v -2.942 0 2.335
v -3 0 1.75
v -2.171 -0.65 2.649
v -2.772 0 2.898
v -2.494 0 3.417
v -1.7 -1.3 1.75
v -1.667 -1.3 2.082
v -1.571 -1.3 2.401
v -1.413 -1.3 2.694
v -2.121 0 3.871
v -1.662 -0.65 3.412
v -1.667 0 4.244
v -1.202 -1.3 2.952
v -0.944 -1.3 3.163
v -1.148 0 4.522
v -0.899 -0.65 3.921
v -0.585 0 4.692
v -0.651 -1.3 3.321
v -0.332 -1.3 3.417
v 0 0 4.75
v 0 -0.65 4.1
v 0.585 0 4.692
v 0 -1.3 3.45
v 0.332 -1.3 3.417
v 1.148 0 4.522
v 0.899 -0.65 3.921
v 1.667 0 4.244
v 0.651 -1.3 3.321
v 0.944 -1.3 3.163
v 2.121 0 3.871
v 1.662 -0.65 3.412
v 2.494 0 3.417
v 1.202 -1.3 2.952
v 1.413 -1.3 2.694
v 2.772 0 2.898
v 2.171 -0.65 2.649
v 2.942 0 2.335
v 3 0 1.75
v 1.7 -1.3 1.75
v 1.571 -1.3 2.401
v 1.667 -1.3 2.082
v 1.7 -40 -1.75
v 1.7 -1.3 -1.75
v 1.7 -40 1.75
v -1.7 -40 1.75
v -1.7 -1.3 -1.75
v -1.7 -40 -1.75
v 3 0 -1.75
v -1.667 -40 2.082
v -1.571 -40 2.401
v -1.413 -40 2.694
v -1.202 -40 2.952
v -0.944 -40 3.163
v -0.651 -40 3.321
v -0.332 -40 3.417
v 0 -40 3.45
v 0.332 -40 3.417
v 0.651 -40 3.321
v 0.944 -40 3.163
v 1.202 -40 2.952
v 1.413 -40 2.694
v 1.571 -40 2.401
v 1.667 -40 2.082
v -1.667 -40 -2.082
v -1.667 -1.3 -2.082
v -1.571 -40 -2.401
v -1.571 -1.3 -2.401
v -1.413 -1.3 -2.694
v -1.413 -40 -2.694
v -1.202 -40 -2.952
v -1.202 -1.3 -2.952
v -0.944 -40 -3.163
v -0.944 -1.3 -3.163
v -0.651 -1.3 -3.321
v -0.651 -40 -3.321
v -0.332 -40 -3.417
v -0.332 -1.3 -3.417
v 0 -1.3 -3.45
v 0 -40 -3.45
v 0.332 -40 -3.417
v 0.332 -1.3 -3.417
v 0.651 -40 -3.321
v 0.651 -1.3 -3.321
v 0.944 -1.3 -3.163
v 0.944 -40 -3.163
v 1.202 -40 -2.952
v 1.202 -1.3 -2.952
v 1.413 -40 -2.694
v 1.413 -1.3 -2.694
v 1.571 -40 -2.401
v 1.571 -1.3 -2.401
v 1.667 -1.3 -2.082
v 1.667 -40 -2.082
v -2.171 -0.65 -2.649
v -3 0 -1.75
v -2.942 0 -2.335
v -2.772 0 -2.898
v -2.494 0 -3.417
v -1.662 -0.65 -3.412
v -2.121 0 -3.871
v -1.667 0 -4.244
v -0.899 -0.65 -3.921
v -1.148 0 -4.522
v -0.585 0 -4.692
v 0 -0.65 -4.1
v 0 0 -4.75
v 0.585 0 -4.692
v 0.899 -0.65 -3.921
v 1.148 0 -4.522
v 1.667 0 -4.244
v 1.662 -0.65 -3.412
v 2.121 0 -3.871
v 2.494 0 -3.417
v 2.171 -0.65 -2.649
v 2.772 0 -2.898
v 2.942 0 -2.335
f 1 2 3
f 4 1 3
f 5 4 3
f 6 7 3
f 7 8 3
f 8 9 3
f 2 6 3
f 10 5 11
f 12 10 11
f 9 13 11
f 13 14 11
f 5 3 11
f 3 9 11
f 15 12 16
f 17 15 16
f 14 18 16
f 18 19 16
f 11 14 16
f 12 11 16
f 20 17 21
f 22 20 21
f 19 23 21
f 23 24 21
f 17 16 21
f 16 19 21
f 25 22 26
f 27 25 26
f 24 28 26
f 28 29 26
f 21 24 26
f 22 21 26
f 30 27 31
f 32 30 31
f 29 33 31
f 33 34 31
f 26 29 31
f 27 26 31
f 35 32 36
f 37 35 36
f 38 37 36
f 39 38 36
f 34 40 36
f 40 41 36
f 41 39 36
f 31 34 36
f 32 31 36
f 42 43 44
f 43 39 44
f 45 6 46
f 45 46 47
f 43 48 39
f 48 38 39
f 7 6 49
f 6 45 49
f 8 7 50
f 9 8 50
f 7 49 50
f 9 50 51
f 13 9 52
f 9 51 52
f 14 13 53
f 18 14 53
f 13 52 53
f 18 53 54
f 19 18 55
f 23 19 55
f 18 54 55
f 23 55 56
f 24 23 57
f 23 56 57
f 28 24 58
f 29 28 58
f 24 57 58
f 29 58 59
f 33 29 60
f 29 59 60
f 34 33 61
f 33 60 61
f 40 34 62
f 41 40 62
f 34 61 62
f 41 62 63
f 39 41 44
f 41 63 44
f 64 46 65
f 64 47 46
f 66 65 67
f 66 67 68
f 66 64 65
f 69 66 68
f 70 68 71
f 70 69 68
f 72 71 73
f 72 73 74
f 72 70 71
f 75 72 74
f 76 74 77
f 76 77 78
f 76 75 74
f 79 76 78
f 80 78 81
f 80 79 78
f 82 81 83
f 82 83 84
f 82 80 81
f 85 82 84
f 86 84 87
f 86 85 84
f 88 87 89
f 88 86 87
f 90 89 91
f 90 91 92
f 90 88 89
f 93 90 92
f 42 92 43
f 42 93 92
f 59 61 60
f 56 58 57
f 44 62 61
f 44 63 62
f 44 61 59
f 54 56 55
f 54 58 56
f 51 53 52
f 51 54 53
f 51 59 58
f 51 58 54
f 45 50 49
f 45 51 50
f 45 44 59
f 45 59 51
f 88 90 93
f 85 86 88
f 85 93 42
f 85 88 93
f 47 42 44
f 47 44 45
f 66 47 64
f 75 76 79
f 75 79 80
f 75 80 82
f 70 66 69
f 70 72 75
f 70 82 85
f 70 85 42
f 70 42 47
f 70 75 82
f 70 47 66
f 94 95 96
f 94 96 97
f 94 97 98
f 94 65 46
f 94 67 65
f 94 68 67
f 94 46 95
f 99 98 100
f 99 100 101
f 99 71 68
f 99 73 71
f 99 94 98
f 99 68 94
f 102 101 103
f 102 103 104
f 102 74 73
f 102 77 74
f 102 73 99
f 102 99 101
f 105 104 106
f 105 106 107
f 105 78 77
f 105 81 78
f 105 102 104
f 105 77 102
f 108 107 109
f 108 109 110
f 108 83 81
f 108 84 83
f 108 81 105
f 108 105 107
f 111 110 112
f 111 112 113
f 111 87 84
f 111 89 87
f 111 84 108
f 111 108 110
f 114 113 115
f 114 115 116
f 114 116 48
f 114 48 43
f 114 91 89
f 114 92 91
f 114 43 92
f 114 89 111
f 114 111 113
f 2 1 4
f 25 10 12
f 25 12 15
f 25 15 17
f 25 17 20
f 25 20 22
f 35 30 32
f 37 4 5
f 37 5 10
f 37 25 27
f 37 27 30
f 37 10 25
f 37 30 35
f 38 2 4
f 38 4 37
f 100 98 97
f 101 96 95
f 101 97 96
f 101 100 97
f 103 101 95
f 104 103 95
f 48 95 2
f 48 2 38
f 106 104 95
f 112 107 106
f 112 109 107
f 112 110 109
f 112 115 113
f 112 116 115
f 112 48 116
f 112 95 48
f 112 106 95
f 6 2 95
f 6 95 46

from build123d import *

# Parameters (mm, degrees)
REVOLUTION001_ANGLE = -90
PAD008_DEPTH        = 1.75


with BuildPart() as m3din7991slot001:
    # Clone2D → Revolution001 (revolve)
    with BuildSketch(Plane.XY.offset(1.75)):
        Polygon((0, 0), (3, 0), (1.7, -1.3), (1.7, -40), (0, -40), align=None)
    revolve(axis=Axis((0, 0, 1.75), (0, 1, 0)), revolution_arc=REVOLUTION001_ANGLE)


with BuildPart() as slotquarter:
    # Sketch016 → Pad008 (new body)
    with BuildSketch(Plane.XY):
        Polygon((0, 0), (3, 0), (1.7, -1.3), (1.7, -40), (0, -40), align=None)
    extrude(amount=PAD008_DEPTH)

    # Fusion001: union M3DIN7991Slot001
    add(m3din7991slot001.part)


with BuildPart() as part_mirroring002:
    # Part__Mirroring002: instance of SlotQuarter
    add(slotquarter.part.mirror(Plane(origin=(0, 0, 0), x_dir=(0, -1, 0), z_dir=(1, 0, 0))))


with BuildPart() as fusion002:
    # Fusion002 base: copy of SlotQuarter
    add(slotquarter.part)

    # Fusion002: union Part__Mirroring002
    add(part_mirroring002.part)


with BuildPart() as part_mirroring003:
    # Part__Mirroring003: instance of Fusion002
    add(fusion002.part.mirror(Plane(origin=(0, 0, 0), x_dir=(0, 1, 0), z_dir=(0, 0, 1))))


with BuildPart() as refine_m3din7991boltslot:
    # Fusion003 base: copy of Fusion002
    add(fusion002.part)

    # Fusion003: union Part__Mirroring003
    add(part_mirroring003.part)


solid = refine_m3din7991boltslot.part
